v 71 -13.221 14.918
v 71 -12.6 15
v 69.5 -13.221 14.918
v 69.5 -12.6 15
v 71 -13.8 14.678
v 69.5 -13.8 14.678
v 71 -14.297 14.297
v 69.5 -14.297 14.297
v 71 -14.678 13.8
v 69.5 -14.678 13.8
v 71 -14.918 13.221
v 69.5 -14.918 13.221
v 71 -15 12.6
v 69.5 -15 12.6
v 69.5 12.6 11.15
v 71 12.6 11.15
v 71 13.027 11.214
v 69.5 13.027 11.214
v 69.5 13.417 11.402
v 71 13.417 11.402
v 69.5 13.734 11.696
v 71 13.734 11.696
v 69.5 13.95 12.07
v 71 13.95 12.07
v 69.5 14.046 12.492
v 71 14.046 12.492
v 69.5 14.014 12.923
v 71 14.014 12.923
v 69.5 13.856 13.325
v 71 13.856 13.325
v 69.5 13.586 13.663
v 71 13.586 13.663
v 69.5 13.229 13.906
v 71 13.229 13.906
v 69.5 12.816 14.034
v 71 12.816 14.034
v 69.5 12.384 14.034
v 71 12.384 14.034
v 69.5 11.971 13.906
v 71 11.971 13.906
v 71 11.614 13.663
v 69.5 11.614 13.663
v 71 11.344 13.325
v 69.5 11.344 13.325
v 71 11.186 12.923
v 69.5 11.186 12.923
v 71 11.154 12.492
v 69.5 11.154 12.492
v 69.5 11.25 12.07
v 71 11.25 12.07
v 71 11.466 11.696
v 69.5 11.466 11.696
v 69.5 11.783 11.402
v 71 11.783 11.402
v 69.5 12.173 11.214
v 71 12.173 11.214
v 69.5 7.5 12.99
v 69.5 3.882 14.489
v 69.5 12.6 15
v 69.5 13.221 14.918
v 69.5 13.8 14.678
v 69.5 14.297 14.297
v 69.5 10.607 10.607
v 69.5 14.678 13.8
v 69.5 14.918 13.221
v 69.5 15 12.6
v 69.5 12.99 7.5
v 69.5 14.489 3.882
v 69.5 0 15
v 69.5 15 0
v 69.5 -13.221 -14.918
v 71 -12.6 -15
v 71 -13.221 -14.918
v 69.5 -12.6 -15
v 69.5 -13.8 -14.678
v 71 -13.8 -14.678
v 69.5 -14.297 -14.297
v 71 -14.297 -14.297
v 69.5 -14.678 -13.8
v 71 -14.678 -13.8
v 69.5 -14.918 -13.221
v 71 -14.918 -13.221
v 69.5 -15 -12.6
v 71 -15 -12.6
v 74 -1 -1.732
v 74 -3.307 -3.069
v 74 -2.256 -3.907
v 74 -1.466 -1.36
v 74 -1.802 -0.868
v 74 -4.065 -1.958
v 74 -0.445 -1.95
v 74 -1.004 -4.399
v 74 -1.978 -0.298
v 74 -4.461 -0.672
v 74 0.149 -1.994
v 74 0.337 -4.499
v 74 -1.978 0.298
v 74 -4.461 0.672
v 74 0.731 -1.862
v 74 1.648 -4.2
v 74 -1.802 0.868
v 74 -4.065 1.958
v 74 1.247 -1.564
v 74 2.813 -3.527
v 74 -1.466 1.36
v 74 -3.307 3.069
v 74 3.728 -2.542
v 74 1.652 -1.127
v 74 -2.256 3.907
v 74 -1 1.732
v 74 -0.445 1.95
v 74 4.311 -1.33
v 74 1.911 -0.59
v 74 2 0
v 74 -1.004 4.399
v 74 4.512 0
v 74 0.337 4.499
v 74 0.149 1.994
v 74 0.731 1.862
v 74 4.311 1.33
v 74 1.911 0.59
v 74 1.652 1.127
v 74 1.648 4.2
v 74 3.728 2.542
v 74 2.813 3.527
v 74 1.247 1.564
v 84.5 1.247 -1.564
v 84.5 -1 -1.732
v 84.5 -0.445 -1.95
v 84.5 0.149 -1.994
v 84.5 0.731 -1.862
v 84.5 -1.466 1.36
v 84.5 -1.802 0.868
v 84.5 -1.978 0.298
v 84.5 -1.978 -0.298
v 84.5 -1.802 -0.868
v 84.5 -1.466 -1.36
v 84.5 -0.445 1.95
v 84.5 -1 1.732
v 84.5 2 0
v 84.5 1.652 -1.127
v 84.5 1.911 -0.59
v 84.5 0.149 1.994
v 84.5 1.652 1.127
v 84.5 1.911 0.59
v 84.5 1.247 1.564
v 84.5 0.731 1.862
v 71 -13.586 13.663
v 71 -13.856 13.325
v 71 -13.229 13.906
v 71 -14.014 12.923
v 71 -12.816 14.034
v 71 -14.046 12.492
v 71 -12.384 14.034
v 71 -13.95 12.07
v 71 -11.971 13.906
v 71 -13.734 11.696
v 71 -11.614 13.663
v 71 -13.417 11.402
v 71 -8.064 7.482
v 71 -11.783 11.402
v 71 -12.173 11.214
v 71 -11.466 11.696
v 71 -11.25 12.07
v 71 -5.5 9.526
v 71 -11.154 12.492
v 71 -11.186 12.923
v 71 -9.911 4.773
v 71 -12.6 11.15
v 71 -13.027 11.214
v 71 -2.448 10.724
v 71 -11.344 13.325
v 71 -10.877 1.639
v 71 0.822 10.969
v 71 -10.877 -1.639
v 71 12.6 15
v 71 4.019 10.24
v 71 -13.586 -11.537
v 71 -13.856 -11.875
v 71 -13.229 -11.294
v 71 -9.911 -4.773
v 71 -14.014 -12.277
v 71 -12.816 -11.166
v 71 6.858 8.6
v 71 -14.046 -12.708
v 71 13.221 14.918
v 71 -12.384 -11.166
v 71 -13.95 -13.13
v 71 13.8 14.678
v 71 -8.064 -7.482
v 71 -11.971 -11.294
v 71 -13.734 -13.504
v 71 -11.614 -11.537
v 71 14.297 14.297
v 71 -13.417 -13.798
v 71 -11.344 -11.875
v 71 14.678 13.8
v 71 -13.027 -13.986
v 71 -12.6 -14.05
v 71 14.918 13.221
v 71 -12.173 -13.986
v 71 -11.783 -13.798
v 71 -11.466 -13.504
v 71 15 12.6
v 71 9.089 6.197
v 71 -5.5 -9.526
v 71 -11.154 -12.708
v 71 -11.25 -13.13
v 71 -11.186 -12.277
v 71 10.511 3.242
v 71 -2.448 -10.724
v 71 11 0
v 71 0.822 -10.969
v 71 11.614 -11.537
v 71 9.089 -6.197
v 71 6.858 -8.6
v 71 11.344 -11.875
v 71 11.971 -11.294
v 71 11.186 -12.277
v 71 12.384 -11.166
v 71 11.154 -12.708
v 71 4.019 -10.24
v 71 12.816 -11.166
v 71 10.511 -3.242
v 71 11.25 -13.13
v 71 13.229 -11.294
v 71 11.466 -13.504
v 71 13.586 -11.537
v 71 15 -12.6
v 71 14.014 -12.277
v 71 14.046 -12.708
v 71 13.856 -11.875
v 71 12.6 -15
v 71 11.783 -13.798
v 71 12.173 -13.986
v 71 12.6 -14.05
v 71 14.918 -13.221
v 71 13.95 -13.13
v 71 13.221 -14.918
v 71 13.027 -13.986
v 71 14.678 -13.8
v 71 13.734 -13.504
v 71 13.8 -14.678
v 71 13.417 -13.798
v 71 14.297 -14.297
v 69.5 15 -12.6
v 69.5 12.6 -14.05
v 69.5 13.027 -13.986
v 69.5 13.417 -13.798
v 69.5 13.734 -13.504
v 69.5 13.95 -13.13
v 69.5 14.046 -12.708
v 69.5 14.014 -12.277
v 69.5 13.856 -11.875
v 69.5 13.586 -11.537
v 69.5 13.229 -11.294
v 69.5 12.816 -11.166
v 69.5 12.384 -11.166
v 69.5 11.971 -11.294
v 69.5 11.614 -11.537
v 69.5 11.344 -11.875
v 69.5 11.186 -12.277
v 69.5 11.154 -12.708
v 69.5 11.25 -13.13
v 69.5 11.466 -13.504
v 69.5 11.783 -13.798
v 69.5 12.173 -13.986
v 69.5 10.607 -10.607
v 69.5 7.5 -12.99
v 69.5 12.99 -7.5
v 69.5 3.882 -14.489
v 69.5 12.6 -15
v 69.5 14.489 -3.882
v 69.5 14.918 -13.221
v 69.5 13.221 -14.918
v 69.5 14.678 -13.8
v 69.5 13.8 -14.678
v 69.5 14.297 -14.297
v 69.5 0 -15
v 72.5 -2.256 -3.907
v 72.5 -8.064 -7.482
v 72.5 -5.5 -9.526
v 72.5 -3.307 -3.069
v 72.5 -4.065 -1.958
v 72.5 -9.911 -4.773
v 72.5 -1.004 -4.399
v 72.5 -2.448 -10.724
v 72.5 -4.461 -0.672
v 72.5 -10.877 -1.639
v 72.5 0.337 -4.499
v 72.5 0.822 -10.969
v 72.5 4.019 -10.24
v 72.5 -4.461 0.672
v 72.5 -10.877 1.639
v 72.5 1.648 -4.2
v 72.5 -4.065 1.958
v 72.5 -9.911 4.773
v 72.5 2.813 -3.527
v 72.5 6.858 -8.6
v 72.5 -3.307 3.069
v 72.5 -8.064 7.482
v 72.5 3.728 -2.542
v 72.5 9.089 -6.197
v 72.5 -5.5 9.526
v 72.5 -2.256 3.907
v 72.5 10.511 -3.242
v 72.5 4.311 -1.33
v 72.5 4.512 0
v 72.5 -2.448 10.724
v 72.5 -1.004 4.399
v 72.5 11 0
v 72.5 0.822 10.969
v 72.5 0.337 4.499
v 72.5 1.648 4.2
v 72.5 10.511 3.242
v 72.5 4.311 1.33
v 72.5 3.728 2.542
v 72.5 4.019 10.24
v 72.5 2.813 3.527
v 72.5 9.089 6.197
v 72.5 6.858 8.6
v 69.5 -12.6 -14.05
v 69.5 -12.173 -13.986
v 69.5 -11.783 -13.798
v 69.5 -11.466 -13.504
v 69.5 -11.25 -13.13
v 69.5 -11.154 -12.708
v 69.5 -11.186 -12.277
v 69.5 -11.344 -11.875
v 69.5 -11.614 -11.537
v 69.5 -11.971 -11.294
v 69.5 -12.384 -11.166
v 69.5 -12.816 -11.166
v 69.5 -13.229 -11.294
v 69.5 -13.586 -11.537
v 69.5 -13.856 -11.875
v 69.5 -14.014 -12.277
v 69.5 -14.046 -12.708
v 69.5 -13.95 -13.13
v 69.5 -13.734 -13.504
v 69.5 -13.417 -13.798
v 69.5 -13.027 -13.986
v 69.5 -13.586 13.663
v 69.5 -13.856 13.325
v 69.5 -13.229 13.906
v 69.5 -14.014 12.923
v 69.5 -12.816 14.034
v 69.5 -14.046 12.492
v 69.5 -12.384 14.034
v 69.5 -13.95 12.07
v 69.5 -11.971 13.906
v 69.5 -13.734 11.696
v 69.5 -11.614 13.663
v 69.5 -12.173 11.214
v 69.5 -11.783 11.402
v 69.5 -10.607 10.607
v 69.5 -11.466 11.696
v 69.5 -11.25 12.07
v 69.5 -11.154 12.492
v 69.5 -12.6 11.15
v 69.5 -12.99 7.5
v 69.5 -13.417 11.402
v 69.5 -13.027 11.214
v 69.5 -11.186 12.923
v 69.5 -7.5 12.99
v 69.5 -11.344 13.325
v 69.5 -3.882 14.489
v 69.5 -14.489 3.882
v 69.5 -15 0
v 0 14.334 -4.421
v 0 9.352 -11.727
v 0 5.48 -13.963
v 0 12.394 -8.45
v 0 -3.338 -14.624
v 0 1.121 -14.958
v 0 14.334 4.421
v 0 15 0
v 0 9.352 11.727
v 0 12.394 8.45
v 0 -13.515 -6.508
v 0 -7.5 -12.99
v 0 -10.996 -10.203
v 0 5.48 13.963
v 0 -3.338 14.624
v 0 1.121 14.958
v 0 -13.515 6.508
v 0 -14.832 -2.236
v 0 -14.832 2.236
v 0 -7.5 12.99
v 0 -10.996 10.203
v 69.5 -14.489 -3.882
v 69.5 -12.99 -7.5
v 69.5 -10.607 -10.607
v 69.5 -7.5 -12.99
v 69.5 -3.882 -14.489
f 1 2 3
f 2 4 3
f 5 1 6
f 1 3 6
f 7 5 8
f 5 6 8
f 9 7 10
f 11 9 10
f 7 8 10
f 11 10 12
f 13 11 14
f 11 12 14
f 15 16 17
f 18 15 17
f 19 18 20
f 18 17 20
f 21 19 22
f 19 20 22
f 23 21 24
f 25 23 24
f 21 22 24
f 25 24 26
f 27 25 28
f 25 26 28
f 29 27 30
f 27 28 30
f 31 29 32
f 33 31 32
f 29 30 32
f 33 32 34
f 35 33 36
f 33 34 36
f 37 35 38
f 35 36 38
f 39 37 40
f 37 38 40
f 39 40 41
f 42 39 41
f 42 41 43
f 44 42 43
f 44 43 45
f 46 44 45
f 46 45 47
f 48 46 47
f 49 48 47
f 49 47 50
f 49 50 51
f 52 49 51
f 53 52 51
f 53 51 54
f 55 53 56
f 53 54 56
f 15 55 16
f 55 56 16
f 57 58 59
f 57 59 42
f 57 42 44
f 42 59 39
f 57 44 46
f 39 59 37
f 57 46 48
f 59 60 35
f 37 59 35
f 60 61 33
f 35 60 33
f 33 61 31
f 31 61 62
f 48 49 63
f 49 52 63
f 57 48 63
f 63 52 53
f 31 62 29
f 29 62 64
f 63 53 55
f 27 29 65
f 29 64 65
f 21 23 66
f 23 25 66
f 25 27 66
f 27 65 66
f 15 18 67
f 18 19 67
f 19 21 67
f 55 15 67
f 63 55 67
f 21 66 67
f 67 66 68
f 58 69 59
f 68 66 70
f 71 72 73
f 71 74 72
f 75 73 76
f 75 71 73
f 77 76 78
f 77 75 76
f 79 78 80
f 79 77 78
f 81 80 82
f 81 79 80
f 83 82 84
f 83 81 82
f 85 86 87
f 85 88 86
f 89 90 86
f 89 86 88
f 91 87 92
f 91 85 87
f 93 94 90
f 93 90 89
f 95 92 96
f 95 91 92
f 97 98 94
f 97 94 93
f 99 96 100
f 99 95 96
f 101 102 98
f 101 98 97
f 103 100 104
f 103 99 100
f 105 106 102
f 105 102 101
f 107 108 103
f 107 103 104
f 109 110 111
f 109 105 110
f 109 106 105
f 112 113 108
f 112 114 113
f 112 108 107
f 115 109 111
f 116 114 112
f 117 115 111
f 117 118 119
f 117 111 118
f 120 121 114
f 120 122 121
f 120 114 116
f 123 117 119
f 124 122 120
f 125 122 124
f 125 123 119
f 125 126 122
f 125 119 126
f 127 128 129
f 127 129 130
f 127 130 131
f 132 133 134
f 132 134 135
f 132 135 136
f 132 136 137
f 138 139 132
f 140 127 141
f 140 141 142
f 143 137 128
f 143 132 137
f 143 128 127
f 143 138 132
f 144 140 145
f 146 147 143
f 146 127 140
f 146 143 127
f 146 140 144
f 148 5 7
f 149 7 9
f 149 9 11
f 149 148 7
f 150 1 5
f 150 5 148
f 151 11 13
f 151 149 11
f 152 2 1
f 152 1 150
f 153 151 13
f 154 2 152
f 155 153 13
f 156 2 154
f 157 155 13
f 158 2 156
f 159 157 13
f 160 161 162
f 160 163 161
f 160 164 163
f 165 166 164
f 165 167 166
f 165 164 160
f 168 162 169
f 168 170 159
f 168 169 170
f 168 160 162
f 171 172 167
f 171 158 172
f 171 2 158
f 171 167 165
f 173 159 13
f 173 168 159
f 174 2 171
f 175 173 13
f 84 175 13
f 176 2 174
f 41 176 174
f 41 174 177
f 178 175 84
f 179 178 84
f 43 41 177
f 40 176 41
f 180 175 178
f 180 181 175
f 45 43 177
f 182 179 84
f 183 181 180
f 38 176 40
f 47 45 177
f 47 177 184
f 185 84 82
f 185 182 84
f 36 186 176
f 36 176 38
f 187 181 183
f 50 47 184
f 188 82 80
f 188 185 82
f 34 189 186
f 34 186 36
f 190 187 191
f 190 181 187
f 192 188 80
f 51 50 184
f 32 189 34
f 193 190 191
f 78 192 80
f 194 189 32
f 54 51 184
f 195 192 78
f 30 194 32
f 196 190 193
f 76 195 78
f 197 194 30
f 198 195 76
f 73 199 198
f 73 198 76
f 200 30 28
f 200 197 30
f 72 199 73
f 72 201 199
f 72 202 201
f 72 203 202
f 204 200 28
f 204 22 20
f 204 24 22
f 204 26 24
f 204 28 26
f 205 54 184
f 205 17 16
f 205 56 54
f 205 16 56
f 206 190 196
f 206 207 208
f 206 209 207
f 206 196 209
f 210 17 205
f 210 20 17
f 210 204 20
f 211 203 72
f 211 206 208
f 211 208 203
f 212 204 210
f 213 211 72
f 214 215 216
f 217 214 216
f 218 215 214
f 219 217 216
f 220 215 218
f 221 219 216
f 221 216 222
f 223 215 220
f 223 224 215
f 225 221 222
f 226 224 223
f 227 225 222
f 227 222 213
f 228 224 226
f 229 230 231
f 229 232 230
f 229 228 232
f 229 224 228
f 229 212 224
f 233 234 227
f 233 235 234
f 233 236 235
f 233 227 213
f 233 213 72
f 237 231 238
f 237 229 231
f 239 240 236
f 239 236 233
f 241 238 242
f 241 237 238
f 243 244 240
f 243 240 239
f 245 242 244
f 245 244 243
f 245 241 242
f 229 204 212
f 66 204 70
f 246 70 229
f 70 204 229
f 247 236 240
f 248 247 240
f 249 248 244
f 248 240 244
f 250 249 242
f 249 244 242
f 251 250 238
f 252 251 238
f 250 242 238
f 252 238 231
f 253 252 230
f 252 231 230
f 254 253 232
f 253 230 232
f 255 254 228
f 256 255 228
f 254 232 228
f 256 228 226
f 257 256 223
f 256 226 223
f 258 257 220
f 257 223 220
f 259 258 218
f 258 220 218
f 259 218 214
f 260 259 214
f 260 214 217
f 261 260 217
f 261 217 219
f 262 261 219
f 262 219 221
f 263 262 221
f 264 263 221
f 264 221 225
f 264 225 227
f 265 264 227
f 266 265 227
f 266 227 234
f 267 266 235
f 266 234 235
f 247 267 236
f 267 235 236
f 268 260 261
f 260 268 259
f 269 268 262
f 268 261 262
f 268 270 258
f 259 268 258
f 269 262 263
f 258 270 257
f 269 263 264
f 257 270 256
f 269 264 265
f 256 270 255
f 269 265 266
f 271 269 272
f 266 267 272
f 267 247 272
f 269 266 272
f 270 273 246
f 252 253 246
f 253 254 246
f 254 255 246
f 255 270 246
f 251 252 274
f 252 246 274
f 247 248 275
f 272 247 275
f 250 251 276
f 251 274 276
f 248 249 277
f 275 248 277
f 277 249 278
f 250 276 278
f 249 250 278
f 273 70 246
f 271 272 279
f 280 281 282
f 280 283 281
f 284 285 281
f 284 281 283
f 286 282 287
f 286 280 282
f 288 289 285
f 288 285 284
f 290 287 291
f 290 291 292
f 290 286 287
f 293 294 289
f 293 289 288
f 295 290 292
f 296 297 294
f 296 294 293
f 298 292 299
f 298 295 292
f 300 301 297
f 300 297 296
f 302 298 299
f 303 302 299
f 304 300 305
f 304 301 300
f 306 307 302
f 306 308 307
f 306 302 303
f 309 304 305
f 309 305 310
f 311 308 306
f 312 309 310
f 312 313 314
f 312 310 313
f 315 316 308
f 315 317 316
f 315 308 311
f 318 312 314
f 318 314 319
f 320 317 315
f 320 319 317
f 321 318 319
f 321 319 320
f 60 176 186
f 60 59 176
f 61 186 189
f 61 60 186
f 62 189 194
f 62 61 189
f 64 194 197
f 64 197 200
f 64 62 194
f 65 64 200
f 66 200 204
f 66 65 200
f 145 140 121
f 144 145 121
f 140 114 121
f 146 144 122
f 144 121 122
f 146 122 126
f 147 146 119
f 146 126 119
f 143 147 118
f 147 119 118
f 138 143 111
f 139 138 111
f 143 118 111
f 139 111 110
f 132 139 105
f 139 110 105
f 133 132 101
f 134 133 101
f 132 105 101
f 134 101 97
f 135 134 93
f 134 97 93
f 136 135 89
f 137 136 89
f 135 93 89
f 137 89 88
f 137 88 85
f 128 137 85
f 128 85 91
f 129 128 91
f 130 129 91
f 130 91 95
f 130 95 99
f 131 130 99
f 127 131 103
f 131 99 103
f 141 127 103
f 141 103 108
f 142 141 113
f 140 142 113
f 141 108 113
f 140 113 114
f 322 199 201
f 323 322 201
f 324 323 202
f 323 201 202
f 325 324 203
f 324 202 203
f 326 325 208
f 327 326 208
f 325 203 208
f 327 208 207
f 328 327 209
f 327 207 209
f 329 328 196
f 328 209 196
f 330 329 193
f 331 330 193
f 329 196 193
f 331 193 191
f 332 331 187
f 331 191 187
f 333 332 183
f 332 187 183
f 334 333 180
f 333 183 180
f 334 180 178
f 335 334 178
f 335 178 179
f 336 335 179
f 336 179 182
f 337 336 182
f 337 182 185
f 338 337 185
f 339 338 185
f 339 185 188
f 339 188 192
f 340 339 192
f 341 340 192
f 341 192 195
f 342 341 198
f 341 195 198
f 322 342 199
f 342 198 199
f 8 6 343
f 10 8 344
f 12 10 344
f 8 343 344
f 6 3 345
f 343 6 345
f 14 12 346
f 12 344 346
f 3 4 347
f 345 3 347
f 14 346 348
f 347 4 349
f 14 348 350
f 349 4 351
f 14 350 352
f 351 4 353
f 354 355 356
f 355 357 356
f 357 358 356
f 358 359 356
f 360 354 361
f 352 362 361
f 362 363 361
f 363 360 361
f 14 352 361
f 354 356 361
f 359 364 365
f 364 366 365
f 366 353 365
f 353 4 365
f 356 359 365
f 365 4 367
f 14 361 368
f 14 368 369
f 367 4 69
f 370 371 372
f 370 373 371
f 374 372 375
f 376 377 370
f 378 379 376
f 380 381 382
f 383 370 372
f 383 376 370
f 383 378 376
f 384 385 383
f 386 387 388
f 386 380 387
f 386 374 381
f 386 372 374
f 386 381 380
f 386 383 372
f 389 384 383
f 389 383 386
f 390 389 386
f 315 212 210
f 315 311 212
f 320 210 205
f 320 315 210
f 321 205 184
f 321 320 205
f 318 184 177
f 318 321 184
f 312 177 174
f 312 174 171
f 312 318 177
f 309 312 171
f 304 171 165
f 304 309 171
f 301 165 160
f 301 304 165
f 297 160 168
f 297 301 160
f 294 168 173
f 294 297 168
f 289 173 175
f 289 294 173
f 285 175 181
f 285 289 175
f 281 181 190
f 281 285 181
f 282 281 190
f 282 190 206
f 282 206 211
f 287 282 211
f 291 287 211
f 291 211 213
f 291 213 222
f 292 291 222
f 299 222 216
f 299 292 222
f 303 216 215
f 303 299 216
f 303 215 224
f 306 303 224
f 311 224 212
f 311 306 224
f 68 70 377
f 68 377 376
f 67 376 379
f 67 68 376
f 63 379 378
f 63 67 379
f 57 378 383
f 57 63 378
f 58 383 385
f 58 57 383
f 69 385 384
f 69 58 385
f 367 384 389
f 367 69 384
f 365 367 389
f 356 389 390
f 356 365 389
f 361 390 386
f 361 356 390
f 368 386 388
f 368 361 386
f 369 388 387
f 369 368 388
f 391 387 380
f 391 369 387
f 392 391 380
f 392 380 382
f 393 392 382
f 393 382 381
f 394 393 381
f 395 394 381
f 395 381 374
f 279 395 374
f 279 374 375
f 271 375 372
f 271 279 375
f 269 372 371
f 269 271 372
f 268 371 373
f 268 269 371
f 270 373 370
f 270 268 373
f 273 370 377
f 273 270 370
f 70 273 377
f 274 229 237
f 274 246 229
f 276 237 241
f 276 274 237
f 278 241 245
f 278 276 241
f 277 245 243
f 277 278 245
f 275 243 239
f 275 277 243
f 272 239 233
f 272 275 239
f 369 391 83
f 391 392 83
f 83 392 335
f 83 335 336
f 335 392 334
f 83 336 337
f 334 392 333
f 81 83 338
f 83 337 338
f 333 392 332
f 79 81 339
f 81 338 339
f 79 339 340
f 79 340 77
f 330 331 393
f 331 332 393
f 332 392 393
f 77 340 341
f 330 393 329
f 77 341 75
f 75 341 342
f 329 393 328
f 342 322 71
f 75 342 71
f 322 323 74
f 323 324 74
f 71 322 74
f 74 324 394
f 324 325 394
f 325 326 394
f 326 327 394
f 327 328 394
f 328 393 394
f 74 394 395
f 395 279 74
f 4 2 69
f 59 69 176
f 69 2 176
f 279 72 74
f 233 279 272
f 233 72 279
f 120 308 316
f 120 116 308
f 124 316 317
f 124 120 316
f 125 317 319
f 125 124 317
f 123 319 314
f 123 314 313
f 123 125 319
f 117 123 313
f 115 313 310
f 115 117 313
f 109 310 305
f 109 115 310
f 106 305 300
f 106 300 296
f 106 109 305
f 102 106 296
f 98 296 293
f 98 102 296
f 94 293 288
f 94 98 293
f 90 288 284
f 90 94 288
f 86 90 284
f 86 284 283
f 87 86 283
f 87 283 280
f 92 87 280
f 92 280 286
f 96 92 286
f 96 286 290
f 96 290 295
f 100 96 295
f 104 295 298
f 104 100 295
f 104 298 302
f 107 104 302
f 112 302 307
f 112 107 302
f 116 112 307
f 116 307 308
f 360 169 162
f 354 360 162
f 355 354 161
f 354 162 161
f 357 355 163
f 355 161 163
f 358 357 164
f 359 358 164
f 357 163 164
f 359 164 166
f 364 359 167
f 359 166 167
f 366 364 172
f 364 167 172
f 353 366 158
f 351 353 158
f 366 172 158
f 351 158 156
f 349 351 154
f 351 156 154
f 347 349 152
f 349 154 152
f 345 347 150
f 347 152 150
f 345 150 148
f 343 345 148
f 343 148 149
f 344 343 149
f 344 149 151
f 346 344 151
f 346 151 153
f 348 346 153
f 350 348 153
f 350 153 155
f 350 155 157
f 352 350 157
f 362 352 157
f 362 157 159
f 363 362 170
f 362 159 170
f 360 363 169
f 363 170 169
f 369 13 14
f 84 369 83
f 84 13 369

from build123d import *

# Parameters (mm, degrees)
SKETCH_2_W      = 30
SKETCH_2_H      = 30
SKETCH_2_R      = 1.45
EXTRUDE_1_DEPTH = 1.5
FILLET_1_R      = 2.4


with BuildPart() as part:
    # Эскиз1 → Повернуть1 (revolve)
    with BuildSketch(Plane.XY):
        Polygon((0, 0), (0, 15), (71, 15), (71, 11), (72.5, 11), (72.5, 4.511822107), (74, 4.511822107), (74, 2), (80, 2), (84.5, 2), (84.5, 0), align=None)
    revolve(axis=Axis((0, 0, 0), (1, 0, 0)))

    # Эскиз2 → Бобышка-Вытянуть1 (add)
    with BuildSketch(Plane(origin=(71, 0, 0), x_dir=(0, 0, -1), z_dir=(1, 0, 0))):
        Rectangle(SKETCH_2_W, SKETCH_2_H)
        with Locations((-12.6, 12.6)):
            Circle(SKETCH_2_R, mode=Mode.SUBTRACT)
        with Locations((12.6, 12.6)):
            Circle(SKETCH_2_R, mode=Mode.SUBTRACT)
        with Locations((12.6, -12.6)):
            Circle(SKETCH_2_R, mode=Mode.SUBTRACT)
        with Locations((-12.6, -12.6)):
            Circle(SKETCH_2_R, mode=Mode.SUBTRACT)
    extrude(amount=-EXTRUDE_1_DEPTH)

    # Скругление1
    fillet_1_edges = [part.edges().sort_by_distance(p)[0] for p in [
        (70.25, -15, -15),
        (70.25, -15, 15),
        (70.25, 15, 15),
        (70.25, 15, -15),
    ]]
    fillet(fillet_1_edges, radius=FILLET_1_R)


solid = part.part
